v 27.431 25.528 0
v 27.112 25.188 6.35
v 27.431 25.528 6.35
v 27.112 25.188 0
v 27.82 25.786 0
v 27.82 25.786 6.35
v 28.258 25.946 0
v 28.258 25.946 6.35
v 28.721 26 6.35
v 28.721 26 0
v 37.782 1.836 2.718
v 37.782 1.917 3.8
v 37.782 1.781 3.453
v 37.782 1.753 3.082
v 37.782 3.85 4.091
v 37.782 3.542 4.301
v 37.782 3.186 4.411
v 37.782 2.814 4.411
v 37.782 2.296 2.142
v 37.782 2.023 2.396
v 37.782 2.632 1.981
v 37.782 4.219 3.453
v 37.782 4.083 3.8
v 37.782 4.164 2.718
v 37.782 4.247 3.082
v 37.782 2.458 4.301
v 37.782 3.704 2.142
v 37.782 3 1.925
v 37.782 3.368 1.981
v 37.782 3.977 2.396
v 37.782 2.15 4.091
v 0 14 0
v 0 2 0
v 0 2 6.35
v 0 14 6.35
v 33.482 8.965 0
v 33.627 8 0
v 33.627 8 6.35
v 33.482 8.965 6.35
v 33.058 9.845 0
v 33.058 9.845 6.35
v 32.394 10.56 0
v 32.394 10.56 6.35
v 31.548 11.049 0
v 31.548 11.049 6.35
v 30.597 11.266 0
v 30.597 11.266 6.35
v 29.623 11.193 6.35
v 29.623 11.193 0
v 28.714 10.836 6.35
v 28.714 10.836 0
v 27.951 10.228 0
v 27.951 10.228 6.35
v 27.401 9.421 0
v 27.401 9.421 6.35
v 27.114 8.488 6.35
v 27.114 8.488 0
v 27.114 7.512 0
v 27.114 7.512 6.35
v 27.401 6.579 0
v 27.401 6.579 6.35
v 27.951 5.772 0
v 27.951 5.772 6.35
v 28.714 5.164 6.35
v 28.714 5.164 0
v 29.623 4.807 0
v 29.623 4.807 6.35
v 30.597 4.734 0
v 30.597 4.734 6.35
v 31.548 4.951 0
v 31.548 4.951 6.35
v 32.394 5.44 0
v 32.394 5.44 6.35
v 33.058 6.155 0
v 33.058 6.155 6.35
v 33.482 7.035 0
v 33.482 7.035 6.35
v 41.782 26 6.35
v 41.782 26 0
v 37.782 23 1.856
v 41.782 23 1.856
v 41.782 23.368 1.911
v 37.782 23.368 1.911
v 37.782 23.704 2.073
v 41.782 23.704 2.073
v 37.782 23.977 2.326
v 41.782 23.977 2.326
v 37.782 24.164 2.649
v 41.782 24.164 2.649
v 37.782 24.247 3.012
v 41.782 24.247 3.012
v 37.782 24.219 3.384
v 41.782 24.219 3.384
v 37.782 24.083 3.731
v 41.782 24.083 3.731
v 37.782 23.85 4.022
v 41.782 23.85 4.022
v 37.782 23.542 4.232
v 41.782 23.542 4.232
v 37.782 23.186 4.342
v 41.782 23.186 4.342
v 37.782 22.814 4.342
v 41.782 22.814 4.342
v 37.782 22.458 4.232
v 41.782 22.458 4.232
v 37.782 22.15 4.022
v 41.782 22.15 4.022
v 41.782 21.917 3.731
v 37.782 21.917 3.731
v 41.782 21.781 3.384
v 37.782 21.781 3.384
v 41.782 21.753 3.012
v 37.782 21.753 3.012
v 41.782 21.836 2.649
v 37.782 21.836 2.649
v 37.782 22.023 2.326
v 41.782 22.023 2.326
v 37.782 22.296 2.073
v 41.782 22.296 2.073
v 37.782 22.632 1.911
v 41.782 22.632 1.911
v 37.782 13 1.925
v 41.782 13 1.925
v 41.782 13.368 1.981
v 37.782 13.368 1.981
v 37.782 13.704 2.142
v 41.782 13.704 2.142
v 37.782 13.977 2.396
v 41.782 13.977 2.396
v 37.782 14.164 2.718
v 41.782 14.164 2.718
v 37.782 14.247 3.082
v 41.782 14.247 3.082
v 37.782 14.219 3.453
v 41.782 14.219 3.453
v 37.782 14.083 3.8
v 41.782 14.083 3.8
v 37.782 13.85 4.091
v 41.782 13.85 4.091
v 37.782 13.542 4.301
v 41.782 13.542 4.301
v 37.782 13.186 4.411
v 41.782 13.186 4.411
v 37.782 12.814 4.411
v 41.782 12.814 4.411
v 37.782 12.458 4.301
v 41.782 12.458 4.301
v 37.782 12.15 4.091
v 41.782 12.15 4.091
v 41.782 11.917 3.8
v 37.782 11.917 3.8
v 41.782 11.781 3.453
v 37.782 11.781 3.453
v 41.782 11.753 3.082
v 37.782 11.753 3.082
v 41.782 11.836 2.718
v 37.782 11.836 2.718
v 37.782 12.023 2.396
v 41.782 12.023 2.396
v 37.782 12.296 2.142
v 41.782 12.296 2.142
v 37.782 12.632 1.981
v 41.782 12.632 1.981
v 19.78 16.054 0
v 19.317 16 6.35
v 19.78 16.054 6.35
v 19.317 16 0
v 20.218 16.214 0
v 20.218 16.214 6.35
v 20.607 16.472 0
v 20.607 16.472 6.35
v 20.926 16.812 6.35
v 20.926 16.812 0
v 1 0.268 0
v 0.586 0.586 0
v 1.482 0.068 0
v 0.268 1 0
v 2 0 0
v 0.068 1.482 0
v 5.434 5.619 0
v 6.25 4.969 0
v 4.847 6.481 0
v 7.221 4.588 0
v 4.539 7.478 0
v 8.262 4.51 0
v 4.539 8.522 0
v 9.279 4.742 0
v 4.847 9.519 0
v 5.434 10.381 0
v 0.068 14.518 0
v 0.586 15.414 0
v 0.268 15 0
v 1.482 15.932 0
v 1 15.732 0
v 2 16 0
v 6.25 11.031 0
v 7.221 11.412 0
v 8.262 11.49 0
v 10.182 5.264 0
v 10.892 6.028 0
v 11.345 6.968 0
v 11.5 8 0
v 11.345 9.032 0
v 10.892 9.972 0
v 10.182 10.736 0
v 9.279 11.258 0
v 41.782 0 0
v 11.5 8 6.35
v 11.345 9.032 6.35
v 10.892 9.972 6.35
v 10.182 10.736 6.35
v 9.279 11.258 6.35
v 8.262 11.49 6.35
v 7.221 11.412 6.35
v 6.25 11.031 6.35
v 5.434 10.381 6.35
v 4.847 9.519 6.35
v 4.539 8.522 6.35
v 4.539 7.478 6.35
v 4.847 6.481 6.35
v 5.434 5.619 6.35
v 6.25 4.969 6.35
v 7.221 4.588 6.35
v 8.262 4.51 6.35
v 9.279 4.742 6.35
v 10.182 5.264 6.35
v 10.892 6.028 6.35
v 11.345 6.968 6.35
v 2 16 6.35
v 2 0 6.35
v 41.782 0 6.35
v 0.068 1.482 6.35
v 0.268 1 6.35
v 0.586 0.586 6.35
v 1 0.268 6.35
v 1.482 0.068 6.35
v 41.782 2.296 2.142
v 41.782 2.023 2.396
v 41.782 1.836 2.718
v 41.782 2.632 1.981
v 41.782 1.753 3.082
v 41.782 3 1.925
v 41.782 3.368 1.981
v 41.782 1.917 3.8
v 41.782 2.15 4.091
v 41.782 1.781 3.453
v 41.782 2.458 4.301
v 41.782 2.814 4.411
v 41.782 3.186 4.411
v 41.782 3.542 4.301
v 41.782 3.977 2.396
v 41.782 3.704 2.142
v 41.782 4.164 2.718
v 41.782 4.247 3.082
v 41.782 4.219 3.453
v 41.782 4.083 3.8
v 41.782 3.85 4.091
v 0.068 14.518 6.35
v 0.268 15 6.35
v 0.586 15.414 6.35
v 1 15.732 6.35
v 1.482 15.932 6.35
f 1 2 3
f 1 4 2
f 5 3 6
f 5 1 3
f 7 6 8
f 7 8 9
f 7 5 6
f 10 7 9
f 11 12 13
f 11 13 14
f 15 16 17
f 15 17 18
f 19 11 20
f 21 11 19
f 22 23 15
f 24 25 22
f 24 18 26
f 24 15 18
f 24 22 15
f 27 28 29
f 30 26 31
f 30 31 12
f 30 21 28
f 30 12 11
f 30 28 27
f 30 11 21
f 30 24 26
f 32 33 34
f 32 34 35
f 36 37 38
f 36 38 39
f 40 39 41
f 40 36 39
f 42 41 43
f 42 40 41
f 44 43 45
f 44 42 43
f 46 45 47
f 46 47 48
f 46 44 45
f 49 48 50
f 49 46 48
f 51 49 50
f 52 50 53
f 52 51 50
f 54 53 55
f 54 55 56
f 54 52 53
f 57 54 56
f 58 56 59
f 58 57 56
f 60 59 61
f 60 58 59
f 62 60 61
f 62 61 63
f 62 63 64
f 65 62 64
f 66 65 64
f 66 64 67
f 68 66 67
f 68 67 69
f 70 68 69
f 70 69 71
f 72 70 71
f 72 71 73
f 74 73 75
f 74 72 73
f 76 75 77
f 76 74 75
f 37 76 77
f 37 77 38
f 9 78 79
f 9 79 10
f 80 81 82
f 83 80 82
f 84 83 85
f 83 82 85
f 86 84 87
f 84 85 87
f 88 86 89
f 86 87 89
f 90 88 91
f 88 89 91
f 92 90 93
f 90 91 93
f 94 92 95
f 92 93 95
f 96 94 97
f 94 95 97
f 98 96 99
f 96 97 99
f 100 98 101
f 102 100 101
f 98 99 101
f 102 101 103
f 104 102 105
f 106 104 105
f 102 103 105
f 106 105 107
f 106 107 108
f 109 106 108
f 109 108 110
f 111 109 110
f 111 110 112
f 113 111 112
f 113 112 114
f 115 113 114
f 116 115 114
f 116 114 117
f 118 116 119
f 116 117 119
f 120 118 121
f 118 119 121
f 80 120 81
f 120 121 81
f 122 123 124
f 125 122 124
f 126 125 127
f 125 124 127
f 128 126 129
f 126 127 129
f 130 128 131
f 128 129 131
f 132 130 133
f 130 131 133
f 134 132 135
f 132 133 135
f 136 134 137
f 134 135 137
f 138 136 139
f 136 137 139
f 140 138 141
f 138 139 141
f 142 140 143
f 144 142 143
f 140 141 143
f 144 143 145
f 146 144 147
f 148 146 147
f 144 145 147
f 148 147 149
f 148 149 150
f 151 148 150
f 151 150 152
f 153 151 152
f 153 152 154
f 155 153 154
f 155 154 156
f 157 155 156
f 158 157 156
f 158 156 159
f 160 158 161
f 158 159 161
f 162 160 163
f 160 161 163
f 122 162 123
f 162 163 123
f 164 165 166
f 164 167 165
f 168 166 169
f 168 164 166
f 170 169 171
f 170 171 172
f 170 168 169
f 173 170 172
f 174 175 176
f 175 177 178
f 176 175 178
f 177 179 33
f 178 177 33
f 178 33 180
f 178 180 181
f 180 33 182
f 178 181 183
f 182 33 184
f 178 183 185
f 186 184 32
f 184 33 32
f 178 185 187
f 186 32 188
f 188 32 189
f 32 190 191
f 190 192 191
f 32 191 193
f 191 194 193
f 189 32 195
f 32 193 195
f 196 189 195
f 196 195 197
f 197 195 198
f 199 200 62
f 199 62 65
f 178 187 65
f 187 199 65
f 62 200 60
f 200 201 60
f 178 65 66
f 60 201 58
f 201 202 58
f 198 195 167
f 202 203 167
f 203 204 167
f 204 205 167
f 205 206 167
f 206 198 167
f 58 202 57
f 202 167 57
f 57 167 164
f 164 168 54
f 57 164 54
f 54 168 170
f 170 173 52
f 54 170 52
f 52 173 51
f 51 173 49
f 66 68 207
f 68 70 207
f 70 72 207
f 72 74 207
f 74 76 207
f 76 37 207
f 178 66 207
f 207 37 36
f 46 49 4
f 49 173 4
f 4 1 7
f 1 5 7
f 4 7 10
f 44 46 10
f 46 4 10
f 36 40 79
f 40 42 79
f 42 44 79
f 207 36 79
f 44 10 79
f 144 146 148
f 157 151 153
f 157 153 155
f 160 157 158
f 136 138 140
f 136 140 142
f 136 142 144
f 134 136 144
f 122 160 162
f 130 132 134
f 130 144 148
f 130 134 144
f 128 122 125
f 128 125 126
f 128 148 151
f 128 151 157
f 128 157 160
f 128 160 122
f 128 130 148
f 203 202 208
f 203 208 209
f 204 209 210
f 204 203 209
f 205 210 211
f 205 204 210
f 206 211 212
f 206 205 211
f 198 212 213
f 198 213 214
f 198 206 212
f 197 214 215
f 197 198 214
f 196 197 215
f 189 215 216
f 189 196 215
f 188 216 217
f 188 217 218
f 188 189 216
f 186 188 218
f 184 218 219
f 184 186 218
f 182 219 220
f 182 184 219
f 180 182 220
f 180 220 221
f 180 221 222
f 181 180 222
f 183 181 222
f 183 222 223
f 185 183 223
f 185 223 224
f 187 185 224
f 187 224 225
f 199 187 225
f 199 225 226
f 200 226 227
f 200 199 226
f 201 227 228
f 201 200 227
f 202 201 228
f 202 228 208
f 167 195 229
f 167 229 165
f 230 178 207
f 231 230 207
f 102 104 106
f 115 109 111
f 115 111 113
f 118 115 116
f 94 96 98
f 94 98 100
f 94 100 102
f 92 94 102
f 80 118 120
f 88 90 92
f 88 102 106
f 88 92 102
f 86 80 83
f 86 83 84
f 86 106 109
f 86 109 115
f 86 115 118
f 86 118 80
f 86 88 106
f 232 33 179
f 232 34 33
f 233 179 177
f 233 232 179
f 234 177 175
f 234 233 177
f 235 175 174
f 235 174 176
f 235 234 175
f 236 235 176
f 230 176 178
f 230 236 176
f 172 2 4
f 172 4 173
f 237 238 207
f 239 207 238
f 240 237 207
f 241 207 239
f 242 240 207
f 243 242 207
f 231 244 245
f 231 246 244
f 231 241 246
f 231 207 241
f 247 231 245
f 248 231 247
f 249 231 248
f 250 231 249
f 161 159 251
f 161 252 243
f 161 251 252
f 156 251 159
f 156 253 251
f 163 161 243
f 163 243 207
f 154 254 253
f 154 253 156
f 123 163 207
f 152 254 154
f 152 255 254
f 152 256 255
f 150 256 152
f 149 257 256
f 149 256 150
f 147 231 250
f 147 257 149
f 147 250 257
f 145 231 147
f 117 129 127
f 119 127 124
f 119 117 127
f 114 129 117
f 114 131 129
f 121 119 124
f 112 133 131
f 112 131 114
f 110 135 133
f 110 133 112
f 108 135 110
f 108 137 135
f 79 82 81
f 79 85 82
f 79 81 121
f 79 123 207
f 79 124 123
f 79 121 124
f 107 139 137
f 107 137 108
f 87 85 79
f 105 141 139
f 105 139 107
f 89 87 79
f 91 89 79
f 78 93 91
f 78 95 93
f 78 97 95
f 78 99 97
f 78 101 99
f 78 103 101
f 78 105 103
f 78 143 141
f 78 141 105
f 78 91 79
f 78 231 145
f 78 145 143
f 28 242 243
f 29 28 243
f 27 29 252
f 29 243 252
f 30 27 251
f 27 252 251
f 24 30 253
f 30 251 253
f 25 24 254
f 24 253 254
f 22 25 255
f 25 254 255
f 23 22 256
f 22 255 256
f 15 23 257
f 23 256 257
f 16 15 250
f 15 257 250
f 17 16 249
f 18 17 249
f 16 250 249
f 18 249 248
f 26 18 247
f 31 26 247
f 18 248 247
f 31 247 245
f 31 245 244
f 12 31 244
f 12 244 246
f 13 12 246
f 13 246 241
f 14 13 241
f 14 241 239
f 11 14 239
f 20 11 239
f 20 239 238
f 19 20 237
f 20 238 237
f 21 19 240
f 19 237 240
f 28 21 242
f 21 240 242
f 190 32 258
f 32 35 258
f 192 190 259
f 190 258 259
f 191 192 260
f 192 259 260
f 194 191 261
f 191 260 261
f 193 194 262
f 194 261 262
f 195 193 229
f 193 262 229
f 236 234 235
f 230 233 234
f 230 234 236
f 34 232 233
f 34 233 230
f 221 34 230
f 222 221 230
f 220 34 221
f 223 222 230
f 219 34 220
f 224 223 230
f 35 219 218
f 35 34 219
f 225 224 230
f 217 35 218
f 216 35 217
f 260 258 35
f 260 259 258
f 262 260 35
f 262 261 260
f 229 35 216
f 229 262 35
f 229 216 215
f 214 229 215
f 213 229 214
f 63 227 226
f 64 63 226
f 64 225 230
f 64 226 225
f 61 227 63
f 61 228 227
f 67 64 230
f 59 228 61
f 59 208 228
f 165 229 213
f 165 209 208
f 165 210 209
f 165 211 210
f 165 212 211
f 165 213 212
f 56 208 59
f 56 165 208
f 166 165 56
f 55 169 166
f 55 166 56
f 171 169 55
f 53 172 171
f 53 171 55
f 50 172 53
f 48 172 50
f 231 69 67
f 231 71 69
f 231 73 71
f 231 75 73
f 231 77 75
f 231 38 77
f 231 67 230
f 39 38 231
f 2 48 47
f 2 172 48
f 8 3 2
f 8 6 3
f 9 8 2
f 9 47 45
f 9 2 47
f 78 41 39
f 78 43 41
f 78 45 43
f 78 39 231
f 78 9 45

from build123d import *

# Parameters (mm, degrees)
SKETCH1_W           = 41.782
SKETCH1_H           = 16
BOSS_EXTRUDE1_DEPTH = 6.35
SKETCH1_6_R         = 3.275
SKETCH1_6_R_2       = 3.5
CUT_EXTRUDE1_DEPTH  = 6.35
FILLET1_R           = 2
SKETCH2_R           = 1.25
CUT_EXTRUDE2_DEPTH  = 4
BOSS_EXTRUDE2_DEPTH = 6.35
FILLET2_R           = 2
SKETCH4_R           = 1.25
CUT_EXTRUDE3_DEPTH  = 4


with BuildPart() as part:
    # Sketch1 → Boss-Extrude1 (new body)
    with BuildSketch(Plane.XY):
        with Locations((20.891, 8)):
            Rectangle(SKETCH1_W, SKETCH1_H)
    extrude(amount=BOSS_EXTRUDE1_DEPTH)

    # Sketch1<6> → Cut-Extrude1 (cut)
    with BuildSketch(Plane.XY):
        with Locations((30.352, 8)):
            Circle(SKETCH1_6_R)
        with Locations((8, 8)):
            Circle(SKETCH1_6_R_2)
    extrude(amount=CUT_EXTRUDE1_DEPTH, mode=Mode.SUBTRACT)

    # Fillet1
    fillet1_edges = [part.edges().sort_by_distance(p)[0] for p in [
        (0, 16, 3.175),
        (0, 0, 3.175),
    ]]
    fillet(fillet1_edges, radius=FILLET1_R)

    # Sketch2 → Cut-Extrude2 (cut)
    with BuildSketch(Plane(origin=(41.782, 0, 0), x_dir=(0, 0, -1), z_dir=(1, 0, 0))):
        with Locations((-3.175, 13)):
            Circle(SKETCH2_R)
        with Locations((-3.175, 3)):
            Circle(SKETCH2_R)
    extrude(amount=-CUT_EXTRUDE2_DEPTH, mode=Mode.SUBTRACT)

    # Sketch3 → Boss-Extrude2 (add)
    with BuildSketch(Plane.XY.offset(6.35)):
        Polygon((20.326281713, 16), (41.782, 16), (41.782, 26), (27.712043107, 26), align=None)
    extrude(amount=-BOSS_EXTRUDE2_DEPTH)

    # Fillet2
    fillet2_edges = [part.edges().sort_by_distance(p)[0] for p in [
        (20.326281713, 16, 3.175),
        (27.712043107, 26, 3.175),
    ]]
    fillet(fillet2_edges, radius=FILLET2_R)

    # Sketch4 → Cut-Extrude3 (cut)
    with BuildSketch(Plane(origin=(41.782, 0, 0), x_dir=(0, 0, -1), z_dir=(1, 0, 0))):
        with Locations((-3.10572404, 23)):
            Circle(SKETCH4_R)
    extrude(amount=-CUT_EXTRUDE3_DEPTH, mode=Mode.SUBTRACT)


solid = part.part
